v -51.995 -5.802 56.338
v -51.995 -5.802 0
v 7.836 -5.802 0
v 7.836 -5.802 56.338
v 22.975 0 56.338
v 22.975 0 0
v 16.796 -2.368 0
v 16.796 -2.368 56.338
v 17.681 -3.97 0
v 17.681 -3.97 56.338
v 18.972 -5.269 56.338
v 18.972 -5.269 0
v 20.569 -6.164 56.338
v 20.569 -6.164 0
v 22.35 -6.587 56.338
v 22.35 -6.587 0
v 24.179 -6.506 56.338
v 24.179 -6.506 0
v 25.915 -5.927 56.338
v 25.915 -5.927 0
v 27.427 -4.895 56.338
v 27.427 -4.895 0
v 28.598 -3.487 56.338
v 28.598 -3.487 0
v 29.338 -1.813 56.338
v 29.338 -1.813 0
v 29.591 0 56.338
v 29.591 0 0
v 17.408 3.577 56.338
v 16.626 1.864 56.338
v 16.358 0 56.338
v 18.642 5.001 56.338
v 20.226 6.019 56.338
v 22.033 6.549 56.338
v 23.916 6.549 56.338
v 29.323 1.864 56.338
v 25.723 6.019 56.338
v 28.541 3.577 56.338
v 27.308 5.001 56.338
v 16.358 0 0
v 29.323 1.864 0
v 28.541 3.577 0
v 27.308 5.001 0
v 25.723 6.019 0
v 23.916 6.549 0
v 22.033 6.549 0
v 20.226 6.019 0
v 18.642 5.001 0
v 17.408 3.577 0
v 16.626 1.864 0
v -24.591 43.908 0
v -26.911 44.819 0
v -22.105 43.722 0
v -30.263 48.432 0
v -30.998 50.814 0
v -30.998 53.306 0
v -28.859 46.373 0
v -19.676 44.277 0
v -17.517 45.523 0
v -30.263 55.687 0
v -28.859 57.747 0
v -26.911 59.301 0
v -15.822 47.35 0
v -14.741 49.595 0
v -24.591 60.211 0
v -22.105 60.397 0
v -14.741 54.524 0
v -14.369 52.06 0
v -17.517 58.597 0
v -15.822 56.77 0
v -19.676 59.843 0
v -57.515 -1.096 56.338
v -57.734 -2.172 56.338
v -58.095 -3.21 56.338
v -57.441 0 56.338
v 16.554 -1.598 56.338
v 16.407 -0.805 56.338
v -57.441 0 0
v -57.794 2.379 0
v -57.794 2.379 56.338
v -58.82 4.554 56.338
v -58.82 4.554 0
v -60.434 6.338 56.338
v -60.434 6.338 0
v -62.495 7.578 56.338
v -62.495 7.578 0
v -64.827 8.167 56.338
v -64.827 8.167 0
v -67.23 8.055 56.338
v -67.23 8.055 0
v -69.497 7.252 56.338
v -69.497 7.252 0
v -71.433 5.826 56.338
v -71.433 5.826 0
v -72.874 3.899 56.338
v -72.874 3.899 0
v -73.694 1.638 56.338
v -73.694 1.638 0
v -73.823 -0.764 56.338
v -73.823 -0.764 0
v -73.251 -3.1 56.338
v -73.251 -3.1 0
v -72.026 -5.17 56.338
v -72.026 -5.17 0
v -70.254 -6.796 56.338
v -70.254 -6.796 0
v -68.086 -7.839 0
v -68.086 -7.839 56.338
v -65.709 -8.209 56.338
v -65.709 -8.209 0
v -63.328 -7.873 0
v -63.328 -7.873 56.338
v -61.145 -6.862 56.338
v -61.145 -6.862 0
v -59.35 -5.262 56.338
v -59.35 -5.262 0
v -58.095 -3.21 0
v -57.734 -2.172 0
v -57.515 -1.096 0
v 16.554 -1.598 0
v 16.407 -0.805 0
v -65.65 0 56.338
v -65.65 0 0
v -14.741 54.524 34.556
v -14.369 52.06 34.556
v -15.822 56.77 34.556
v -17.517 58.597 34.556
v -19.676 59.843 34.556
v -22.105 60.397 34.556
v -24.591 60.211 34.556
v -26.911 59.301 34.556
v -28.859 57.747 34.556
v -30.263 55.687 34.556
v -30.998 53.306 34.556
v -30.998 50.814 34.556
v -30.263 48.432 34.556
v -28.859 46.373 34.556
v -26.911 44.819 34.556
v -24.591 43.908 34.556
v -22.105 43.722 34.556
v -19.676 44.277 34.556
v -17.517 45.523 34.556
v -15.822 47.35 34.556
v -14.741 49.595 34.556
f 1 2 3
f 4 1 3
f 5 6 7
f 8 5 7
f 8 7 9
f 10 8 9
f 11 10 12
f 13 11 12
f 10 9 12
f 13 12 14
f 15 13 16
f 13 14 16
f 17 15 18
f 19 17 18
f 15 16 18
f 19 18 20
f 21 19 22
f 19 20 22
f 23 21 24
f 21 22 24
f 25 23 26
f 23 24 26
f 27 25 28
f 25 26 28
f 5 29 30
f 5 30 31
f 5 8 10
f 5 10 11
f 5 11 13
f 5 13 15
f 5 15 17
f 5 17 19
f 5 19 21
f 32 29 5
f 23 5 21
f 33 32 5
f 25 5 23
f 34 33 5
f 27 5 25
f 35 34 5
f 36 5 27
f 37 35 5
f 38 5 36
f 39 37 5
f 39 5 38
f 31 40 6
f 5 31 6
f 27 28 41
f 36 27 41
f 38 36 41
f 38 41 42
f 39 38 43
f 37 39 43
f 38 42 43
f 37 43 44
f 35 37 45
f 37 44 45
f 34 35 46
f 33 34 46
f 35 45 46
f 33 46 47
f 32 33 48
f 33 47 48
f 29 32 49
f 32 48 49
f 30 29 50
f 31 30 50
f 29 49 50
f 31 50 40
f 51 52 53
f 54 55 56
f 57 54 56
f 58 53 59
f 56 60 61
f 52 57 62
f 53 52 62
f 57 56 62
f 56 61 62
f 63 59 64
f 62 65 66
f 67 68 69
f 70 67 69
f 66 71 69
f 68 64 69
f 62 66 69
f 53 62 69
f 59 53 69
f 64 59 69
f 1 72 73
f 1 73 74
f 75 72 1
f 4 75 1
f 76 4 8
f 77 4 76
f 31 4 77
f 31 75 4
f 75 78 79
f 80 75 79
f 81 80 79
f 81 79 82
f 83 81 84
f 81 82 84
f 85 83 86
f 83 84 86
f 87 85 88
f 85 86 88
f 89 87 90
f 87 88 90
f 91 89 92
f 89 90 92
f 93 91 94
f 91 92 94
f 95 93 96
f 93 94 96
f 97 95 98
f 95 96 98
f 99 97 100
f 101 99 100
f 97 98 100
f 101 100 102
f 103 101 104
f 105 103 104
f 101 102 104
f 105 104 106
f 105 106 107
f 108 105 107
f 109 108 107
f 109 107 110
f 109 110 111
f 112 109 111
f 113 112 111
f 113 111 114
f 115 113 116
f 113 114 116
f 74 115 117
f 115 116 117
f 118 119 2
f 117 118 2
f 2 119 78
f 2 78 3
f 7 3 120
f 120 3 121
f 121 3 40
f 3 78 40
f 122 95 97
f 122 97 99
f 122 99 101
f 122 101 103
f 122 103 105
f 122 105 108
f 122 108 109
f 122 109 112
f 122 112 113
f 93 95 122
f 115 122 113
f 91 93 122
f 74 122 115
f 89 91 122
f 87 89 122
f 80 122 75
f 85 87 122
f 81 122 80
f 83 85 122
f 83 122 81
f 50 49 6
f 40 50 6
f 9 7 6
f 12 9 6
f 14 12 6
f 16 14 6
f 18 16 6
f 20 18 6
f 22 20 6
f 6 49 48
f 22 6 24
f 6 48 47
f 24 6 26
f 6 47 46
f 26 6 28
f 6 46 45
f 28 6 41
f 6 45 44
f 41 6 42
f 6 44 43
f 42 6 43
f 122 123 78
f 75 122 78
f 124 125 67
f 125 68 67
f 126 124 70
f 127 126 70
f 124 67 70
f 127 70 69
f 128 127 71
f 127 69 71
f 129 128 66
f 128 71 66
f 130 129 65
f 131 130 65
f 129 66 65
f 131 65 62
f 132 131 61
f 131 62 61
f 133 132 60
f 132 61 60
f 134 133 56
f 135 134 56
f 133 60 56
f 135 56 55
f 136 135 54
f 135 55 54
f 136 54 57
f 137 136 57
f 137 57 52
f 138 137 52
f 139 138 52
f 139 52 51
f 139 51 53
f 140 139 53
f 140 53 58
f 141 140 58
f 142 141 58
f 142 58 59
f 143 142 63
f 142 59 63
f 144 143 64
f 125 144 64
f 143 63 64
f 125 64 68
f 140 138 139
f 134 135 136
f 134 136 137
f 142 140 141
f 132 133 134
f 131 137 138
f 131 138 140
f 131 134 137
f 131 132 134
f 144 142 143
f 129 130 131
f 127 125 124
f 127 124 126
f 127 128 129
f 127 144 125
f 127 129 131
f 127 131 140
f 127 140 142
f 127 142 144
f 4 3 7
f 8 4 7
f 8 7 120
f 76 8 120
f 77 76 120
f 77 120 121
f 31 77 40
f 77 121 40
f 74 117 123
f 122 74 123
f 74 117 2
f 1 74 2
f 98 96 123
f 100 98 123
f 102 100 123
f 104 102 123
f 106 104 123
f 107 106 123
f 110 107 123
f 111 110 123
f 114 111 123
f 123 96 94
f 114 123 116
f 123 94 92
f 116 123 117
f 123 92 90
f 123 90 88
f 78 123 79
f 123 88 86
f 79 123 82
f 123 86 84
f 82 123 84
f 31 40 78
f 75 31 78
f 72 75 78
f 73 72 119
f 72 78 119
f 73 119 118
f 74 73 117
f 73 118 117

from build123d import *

# Parameters (mm, degrees)
F1_DEPTH = 56.3383996487
F2_R     = 8.361065963
F3_DEPTH = 9.1555975378
F4_DEPTH = 25.4


with BuildPart() as f1:
    # F0 (on Top) → F1 (new body)
    with BuildSketch(Plane.XY):
        with BuildLine():
            Line((-65.6499601901, 0), (-57.4411129349, 0))
            ThreePointArc((-57.4411129349, 0), (-73.6937373632, 1.6379322476), (-58.0947545399, -3.2099907855))
            Line((-58.0947545399, -3.2099907855), (-65.6499601901, 0))
        make_face()
    extrude(amount=F1_DEPTH)


with BuildPart() as f1b:
    # F0 (on Top) → F1, piece 2 (new body)
    with BuildSketch(Plane.XY):
        with BuildLine():
            Line((16.3579449737, 0), (-57.4411129349, 0))
            ThreePointArc((-57.4411129349, 0), (-57.6061830169, -1.6379322476), (-58.0947545399, -3.2099907855))
            Line((-58.0947545399, -3.2099907855), (-51.9946552813, -5.8017484844))
            Line((-51.9946552813, -5.8017484844), (7.8355269507, -5.8017484844))
            Line((7.8355269507, -5.8017484844), (16.7961123026, -2.3678050832))
            ThreePointArc((16.7961123026, -2.3678050832), (16.4684088799, -1.2040028571), (16.3579449737, 0))
        make_face()
    extrude(amount=F1_DEPTH)


with BuildPart() as f1c:
    # F0 (on Top) → F1, piece 3 (new body)
    with BuildSketch(Plane.XY):
        with BuildLine():
            ThreePointArc((29.5914544976, 0), (22.9746997356, 6.616754762), (16.3579449737, 0))
            Line((16.3579449737, 0), (22.9746997356, 0))
            Line((22.9746997356, 0), (16.7961123026, -2.3678050832))
            ThreePointArc((16.7961123026, -2.3678050832), (24.1787025928, -6.5062908558), (29.5914544976, 0))
        make_face()
    extrude(amount=F1_DEPTH)


with BuildPart() as f3:
    # F2 (on Top) → F3 (new body)
    with BuildSketch(Plane.XY):
        with Locations((-22.7302759886, 52.0596653223)):
            Circle(F2_R)
    extrude(amount=F3_DEPTH)

    # F4 (add): a face of the model
    f4_faces = [f3.faces().sort_by_distance(p)[0] for p in [
        (-22.7302759886, 52.0596653223, 9.1555975378),
    ]]
    extrude(f4_faces, amount=F4_DEPTH)


solid = Compound([f1.part, f1b.part, f1c.part, f3.part])
